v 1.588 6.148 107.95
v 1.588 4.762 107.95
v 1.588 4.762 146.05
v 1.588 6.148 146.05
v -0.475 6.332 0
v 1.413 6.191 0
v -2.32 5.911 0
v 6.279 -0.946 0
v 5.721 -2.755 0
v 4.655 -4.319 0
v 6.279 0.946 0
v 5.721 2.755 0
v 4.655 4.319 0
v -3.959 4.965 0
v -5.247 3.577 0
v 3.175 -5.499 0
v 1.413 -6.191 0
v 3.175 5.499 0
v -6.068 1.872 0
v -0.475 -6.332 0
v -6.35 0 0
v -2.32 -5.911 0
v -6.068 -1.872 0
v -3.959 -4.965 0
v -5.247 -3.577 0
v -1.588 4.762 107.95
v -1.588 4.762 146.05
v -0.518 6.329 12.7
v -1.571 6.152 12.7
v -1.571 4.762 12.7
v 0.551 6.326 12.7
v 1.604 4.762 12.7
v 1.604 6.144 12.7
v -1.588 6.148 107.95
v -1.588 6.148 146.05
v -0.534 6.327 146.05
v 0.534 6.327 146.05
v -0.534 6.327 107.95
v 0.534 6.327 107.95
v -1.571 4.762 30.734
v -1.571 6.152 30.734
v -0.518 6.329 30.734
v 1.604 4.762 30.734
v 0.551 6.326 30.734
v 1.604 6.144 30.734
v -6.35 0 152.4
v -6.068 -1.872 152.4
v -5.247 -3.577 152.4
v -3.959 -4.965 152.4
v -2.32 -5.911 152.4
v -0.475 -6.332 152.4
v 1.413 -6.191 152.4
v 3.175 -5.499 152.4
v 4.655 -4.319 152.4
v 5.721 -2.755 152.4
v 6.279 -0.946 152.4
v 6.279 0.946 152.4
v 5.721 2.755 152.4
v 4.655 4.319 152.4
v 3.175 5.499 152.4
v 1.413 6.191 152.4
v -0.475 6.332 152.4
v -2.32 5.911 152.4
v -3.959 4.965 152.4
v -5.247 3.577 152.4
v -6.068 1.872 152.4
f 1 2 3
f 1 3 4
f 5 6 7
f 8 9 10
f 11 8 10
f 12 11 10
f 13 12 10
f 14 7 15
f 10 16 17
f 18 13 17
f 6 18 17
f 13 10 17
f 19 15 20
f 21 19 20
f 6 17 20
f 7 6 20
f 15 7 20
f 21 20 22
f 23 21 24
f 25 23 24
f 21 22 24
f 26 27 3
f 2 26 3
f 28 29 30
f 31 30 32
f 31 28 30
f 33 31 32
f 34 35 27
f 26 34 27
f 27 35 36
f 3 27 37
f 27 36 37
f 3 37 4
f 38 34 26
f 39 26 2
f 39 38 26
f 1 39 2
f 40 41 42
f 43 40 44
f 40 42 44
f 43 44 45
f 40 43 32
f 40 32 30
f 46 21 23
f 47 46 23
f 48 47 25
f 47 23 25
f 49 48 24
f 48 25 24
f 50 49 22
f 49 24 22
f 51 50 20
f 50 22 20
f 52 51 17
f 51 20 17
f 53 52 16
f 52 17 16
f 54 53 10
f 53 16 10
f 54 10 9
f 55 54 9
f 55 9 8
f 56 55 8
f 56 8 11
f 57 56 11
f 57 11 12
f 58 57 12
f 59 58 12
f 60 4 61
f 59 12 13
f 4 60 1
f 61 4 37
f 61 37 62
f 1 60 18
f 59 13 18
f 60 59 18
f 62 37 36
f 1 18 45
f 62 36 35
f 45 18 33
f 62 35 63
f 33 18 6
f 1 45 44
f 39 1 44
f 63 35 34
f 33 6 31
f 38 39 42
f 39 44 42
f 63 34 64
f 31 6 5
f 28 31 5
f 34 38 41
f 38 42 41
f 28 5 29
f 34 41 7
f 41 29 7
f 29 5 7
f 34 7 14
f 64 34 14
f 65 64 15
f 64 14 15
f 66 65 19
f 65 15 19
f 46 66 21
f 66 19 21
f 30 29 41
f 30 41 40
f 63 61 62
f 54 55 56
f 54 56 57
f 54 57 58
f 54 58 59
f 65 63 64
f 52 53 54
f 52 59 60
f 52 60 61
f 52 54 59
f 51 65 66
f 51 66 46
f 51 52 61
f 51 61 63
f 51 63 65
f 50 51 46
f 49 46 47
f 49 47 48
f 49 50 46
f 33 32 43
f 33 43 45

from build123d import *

# Parameters (mm, degrees)
SKETCH1_R           = 6.35
BOSS_EXTRUDE1_DEPTH = 152.4
CUT_EXTRUDE1_DEPTH  = 18.034
CUT_EXTRUDE2_DEPTH  = 38.1


with BuildPart() as part:
    # Sketch1 → Boss-Extrude1 (new body)
    with BuildSketch(Plane.XY):
        with Locations(Location((0, 0, 0), (0, 0, 180))):
            Circle(SKETCH1_R)
    extrude(amount=BOSS_EXTRUDE1_DEPTH)

    # Sketch2 → Cut-Extrude1 (cut)
    with BuildSketch(Plane(origin=(0, 0, 12.7), x_dir=(-1, 0, 0), z_dir=(0, 0, -1))):
        Polygon((1.571433325, 4.7625), (-0.016066675, 4.7625), (-1.603566675, 4.7625), (-1.603566675, 7.9375), (1.571433325, 7.9375), align=None)
    extrude(amount=-CUT_EXTRUDE1_DEPTH, mode=Mode.SUBTRACT)

    # Sketch3 → Cut-Extrude2 (cut)
    with BuildSketch(Plane.XY.offset(146.05)):
        Polygon((0, 4.7625), (1.5875, 4.7625), (1.5875, 7.9375), (-1.5875, 7.9375), (-1.5875, 4.7625), align=None)
    extrude(amount=-CUT_EXTRUDE2_DEPTH, mode=Mode.SUBTRACT)


solid = part.part
